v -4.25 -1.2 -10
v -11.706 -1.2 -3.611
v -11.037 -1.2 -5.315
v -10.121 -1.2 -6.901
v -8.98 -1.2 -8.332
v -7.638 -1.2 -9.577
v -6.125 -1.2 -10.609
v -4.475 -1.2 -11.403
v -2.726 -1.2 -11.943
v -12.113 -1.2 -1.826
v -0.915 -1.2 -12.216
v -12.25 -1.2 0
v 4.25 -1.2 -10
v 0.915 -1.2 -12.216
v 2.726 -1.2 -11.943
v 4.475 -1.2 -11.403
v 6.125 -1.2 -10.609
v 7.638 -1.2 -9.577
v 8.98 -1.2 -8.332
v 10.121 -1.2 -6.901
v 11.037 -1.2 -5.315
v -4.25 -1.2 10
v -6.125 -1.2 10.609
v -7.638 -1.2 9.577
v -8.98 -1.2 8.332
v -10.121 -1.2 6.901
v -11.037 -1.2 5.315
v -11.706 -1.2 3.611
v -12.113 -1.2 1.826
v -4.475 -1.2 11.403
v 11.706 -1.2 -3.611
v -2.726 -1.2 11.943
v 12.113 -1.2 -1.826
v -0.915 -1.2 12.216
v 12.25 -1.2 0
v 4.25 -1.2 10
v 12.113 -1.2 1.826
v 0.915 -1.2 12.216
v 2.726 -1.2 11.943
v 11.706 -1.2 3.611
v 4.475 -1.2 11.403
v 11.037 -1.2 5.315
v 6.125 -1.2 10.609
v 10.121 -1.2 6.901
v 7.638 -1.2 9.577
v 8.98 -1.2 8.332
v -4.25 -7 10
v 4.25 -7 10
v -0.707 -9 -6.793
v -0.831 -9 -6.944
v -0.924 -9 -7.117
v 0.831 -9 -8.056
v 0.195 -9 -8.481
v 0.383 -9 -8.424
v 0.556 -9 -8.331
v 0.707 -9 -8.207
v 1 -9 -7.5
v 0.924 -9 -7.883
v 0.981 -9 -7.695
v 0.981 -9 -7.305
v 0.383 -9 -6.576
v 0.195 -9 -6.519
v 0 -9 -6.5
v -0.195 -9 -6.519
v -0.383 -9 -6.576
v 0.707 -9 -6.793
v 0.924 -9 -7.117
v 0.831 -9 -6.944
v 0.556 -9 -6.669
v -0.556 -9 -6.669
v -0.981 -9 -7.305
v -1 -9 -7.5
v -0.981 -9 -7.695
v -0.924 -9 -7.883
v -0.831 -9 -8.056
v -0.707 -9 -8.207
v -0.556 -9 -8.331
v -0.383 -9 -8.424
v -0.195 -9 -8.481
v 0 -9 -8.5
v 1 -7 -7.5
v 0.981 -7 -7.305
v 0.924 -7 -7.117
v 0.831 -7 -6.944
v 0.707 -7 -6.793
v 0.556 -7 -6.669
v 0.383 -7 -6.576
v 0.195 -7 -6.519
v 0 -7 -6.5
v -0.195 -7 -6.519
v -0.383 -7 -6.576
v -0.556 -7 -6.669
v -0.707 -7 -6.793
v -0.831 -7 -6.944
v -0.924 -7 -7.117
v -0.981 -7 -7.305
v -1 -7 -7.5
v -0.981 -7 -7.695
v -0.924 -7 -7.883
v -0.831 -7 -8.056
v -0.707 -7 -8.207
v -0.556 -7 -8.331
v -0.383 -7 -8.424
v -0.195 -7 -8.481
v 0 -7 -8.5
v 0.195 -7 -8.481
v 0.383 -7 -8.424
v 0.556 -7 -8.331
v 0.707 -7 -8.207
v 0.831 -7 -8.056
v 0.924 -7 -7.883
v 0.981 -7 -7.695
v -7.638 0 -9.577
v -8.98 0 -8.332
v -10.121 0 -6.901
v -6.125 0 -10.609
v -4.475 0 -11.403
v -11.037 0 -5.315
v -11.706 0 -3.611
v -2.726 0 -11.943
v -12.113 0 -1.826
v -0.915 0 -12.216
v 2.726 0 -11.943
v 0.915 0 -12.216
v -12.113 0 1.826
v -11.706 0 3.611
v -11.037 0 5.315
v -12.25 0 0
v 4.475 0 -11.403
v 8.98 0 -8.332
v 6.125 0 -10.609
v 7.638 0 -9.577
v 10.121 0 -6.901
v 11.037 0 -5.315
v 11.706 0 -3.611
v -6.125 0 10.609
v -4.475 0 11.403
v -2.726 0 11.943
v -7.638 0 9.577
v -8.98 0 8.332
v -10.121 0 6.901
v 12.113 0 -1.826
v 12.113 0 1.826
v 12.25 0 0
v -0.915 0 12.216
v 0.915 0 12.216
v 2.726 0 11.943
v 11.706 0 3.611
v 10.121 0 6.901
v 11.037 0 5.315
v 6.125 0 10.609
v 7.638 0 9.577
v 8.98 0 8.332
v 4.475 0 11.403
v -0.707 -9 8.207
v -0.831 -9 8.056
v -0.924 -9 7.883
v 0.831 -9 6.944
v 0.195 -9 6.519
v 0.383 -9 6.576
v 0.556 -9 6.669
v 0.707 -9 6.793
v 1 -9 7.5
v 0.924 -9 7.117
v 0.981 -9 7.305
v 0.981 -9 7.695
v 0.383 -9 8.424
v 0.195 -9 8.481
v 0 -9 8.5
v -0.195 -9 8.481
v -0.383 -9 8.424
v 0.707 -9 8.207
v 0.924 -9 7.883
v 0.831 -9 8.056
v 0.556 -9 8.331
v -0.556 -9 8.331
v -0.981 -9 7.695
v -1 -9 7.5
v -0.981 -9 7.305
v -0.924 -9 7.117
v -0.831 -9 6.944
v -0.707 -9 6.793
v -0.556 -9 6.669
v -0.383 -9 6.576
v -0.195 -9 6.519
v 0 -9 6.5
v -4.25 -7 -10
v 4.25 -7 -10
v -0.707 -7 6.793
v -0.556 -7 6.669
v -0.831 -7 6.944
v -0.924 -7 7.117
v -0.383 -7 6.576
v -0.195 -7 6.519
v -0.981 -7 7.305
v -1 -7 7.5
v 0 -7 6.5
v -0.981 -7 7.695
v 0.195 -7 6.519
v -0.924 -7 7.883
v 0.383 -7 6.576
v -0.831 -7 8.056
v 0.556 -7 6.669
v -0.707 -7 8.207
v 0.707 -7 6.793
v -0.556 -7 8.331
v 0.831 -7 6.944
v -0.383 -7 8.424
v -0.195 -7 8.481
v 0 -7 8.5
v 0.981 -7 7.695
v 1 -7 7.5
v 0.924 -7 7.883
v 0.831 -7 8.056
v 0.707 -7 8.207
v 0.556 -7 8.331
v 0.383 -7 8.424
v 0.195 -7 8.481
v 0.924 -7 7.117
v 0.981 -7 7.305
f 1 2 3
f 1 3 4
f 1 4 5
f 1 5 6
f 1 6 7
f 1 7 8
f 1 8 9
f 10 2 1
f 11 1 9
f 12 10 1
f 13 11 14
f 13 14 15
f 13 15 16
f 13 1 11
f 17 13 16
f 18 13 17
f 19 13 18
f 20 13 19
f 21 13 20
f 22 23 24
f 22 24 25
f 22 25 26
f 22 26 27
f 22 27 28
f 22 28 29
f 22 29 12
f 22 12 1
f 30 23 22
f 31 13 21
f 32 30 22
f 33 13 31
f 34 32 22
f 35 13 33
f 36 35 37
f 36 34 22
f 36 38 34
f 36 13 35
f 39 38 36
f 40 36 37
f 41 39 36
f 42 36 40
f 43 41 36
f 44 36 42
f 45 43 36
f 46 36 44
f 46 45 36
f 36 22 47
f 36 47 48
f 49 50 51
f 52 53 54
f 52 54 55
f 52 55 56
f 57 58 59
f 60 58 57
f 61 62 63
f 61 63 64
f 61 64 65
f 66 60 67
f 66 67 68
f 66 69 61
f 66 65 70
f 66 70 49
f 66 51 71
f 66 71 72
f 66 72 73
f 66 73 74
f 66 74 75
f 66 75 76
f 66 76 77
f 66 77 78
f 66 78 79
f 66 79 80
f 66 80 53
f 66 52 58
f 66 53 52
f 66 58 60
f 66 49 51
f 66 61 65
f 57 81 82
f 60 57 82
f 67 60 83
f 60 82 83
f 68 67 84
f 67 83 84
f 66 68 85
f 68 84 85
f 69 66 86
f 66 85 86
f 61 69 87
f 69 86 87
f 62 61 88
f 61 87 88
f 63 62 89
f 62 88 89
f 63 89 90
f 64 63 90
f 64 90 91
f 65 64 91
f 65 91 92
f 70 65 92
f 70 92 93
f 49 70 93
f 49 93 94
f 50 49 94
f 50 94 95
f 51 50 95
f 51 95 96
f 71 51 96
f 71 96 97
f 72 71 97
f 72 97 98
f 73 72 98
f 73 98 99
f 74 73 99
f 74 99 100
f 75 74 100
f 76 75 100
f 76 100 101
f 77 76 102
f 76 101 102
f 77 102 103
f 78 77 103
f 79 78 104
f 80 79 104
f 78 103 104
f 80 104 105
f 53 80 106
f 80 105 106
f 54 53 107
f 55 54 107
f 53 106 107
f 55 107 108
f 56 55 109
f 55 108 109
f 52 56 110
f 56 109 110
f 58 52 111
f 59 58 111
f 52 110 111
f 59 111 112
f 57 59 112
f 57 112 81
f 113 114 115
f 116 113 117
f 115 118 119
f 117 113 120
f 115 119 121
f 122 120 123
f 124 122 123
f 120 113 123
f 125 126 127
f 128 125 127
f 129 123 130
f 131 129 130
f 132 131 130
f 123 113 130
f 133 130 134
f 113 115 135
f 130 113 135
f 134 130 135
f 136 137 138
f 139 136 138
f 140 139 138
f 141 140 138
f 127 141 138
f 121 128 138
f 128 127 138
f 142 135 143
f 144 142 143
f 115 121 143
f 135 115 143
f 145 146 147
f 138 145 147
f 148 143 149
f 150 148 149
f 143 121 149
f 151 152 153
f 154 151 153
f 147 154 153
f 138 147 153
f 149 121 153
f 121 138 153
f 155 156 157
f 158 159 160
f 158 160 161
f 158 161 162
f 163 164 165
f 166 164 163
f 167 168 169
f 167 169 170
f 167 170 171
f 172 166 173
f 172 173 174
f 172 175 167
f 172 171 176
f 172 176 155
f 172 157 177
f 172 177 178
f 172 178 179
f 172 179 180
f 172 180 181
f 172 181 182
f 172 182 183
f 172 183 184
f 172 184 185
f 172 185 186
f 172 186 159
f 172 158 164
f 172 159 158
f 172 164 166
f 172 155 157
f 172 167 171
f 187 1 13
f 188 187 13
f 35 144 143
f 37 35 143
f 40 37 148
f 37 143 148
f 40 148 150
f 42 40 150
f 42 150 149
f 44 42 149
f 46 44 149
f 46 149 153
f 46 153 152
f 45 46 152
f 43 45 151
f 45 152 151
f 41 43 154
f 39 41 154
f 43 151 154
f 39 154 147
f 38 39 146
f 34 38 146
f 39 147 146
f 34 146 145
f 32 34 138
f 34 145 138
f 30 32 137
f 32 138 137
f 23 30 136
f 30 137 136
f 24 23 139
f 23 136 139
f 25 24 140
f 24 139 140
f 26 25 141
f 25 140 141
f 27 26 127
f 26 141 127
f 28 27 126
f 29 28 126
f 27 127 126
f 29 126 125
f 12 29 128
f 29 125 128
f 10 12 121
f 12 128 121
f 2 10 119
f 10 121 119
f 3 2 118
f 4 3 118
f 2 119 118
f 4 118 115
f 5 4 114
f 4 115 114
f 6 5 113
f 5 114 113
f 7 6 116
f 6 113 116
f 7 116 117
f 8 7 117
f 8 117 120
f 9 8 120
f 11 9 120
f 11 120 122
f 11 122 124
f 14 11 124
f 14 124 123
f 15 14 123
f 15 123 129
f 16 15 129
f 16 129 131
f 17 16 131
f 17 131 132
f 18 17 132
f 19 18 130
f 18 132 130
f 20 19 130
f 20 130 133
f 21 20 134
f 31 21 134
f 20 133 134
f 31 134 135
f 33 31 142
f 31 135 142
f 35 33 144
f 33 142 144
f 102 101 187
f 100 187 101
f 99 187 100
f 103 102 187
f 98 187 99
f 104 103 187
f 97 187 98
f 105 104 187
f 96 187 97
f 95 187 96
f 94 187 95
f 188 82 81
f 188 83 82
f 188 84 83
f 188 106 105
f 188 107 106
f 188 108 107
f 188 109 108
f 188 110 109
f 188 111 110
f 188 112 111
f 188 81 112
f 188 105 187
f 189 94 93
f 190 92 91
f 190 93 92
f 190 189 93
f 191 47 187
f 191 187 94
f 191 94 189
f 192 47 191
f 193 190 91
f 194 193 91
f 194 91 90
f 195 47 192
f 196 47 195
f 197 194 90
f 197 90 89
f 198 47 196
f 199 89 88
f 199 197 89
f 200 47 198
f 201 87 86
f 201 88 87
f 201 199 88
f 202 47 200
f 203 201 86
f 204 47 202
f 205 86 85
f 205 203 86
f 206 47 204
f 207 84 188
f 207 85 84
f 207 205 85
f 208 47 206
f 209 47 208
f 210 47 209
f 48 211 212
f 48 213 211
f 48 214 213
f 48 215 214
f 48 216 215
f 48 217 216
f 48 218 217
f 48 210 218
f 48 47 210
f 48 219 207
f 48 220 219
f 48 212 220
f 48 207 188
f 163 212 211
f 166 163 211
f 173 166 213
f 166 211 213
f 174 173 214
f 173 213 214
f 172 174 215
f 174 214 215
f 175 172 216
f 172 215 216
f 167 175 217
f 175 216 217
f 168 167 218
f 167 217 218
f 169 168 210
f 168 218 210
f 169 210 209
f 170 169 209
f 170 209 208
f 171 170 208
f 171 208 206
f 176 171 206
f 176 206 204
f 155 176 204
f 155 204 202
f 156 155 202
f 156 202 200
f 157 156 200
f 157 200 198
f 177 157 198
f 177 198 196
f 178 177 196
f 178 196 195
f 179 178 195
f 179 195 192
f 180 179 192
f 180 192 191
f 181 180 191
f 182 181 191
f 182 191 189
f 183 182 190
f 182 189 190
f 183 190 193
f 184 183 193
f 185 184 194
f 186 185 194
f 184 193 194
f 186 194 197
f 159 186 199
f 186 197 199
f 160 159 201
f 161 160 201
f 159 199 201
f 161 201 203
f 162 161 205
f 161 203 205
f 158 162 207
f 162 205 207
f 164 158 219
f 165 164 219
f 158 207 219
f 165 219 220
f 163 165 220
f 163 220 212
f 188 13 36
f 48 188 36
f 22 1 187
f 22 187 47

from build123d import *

# Parameters (mm, degrees)
F0_R     = 12.25
F0_W     = 8.5
F0_H     = 20
F1_DEPTH = 1.2
F0_R_2   = 1
F2_DEPTH = 7
F3_DEPTH = 9


with BuildPart() as f1:
    # F0 (on Front) → F1 (new body)
    with BuildSketch(Plane.XZ):
        Circle(F0_R)
        Rectangle(F0_W, F0_H, mode=Mode.SUBTRACT)
    extrude(amount=F1_DEPTH)

    # F0 (on Front) → F2 (join)
    with BuildSketch(Plane.XZ):
        Rectangle(F0_W, F0_H)
        with Locations((0, -7.5)):
            Circle(F0_R_2, mode=Mode.SUBTRACT)
        with Locations((0, 7.5)):
            Circle(F0_R_2, mode=Mode.SUBTRACT)
    extrude(amount=F2_DEPTH)

    # F0 (on Front) → F3 (join)
    with BuildSketch(Plane.XZ):
        with Locations((0, 7.5)):
            Circle(F0_R_2)
        with Locations((0, -7.5)):
            Circle(F0_R_2)
    extrude(amount=F3_DEPTH)


solid = f1.part
